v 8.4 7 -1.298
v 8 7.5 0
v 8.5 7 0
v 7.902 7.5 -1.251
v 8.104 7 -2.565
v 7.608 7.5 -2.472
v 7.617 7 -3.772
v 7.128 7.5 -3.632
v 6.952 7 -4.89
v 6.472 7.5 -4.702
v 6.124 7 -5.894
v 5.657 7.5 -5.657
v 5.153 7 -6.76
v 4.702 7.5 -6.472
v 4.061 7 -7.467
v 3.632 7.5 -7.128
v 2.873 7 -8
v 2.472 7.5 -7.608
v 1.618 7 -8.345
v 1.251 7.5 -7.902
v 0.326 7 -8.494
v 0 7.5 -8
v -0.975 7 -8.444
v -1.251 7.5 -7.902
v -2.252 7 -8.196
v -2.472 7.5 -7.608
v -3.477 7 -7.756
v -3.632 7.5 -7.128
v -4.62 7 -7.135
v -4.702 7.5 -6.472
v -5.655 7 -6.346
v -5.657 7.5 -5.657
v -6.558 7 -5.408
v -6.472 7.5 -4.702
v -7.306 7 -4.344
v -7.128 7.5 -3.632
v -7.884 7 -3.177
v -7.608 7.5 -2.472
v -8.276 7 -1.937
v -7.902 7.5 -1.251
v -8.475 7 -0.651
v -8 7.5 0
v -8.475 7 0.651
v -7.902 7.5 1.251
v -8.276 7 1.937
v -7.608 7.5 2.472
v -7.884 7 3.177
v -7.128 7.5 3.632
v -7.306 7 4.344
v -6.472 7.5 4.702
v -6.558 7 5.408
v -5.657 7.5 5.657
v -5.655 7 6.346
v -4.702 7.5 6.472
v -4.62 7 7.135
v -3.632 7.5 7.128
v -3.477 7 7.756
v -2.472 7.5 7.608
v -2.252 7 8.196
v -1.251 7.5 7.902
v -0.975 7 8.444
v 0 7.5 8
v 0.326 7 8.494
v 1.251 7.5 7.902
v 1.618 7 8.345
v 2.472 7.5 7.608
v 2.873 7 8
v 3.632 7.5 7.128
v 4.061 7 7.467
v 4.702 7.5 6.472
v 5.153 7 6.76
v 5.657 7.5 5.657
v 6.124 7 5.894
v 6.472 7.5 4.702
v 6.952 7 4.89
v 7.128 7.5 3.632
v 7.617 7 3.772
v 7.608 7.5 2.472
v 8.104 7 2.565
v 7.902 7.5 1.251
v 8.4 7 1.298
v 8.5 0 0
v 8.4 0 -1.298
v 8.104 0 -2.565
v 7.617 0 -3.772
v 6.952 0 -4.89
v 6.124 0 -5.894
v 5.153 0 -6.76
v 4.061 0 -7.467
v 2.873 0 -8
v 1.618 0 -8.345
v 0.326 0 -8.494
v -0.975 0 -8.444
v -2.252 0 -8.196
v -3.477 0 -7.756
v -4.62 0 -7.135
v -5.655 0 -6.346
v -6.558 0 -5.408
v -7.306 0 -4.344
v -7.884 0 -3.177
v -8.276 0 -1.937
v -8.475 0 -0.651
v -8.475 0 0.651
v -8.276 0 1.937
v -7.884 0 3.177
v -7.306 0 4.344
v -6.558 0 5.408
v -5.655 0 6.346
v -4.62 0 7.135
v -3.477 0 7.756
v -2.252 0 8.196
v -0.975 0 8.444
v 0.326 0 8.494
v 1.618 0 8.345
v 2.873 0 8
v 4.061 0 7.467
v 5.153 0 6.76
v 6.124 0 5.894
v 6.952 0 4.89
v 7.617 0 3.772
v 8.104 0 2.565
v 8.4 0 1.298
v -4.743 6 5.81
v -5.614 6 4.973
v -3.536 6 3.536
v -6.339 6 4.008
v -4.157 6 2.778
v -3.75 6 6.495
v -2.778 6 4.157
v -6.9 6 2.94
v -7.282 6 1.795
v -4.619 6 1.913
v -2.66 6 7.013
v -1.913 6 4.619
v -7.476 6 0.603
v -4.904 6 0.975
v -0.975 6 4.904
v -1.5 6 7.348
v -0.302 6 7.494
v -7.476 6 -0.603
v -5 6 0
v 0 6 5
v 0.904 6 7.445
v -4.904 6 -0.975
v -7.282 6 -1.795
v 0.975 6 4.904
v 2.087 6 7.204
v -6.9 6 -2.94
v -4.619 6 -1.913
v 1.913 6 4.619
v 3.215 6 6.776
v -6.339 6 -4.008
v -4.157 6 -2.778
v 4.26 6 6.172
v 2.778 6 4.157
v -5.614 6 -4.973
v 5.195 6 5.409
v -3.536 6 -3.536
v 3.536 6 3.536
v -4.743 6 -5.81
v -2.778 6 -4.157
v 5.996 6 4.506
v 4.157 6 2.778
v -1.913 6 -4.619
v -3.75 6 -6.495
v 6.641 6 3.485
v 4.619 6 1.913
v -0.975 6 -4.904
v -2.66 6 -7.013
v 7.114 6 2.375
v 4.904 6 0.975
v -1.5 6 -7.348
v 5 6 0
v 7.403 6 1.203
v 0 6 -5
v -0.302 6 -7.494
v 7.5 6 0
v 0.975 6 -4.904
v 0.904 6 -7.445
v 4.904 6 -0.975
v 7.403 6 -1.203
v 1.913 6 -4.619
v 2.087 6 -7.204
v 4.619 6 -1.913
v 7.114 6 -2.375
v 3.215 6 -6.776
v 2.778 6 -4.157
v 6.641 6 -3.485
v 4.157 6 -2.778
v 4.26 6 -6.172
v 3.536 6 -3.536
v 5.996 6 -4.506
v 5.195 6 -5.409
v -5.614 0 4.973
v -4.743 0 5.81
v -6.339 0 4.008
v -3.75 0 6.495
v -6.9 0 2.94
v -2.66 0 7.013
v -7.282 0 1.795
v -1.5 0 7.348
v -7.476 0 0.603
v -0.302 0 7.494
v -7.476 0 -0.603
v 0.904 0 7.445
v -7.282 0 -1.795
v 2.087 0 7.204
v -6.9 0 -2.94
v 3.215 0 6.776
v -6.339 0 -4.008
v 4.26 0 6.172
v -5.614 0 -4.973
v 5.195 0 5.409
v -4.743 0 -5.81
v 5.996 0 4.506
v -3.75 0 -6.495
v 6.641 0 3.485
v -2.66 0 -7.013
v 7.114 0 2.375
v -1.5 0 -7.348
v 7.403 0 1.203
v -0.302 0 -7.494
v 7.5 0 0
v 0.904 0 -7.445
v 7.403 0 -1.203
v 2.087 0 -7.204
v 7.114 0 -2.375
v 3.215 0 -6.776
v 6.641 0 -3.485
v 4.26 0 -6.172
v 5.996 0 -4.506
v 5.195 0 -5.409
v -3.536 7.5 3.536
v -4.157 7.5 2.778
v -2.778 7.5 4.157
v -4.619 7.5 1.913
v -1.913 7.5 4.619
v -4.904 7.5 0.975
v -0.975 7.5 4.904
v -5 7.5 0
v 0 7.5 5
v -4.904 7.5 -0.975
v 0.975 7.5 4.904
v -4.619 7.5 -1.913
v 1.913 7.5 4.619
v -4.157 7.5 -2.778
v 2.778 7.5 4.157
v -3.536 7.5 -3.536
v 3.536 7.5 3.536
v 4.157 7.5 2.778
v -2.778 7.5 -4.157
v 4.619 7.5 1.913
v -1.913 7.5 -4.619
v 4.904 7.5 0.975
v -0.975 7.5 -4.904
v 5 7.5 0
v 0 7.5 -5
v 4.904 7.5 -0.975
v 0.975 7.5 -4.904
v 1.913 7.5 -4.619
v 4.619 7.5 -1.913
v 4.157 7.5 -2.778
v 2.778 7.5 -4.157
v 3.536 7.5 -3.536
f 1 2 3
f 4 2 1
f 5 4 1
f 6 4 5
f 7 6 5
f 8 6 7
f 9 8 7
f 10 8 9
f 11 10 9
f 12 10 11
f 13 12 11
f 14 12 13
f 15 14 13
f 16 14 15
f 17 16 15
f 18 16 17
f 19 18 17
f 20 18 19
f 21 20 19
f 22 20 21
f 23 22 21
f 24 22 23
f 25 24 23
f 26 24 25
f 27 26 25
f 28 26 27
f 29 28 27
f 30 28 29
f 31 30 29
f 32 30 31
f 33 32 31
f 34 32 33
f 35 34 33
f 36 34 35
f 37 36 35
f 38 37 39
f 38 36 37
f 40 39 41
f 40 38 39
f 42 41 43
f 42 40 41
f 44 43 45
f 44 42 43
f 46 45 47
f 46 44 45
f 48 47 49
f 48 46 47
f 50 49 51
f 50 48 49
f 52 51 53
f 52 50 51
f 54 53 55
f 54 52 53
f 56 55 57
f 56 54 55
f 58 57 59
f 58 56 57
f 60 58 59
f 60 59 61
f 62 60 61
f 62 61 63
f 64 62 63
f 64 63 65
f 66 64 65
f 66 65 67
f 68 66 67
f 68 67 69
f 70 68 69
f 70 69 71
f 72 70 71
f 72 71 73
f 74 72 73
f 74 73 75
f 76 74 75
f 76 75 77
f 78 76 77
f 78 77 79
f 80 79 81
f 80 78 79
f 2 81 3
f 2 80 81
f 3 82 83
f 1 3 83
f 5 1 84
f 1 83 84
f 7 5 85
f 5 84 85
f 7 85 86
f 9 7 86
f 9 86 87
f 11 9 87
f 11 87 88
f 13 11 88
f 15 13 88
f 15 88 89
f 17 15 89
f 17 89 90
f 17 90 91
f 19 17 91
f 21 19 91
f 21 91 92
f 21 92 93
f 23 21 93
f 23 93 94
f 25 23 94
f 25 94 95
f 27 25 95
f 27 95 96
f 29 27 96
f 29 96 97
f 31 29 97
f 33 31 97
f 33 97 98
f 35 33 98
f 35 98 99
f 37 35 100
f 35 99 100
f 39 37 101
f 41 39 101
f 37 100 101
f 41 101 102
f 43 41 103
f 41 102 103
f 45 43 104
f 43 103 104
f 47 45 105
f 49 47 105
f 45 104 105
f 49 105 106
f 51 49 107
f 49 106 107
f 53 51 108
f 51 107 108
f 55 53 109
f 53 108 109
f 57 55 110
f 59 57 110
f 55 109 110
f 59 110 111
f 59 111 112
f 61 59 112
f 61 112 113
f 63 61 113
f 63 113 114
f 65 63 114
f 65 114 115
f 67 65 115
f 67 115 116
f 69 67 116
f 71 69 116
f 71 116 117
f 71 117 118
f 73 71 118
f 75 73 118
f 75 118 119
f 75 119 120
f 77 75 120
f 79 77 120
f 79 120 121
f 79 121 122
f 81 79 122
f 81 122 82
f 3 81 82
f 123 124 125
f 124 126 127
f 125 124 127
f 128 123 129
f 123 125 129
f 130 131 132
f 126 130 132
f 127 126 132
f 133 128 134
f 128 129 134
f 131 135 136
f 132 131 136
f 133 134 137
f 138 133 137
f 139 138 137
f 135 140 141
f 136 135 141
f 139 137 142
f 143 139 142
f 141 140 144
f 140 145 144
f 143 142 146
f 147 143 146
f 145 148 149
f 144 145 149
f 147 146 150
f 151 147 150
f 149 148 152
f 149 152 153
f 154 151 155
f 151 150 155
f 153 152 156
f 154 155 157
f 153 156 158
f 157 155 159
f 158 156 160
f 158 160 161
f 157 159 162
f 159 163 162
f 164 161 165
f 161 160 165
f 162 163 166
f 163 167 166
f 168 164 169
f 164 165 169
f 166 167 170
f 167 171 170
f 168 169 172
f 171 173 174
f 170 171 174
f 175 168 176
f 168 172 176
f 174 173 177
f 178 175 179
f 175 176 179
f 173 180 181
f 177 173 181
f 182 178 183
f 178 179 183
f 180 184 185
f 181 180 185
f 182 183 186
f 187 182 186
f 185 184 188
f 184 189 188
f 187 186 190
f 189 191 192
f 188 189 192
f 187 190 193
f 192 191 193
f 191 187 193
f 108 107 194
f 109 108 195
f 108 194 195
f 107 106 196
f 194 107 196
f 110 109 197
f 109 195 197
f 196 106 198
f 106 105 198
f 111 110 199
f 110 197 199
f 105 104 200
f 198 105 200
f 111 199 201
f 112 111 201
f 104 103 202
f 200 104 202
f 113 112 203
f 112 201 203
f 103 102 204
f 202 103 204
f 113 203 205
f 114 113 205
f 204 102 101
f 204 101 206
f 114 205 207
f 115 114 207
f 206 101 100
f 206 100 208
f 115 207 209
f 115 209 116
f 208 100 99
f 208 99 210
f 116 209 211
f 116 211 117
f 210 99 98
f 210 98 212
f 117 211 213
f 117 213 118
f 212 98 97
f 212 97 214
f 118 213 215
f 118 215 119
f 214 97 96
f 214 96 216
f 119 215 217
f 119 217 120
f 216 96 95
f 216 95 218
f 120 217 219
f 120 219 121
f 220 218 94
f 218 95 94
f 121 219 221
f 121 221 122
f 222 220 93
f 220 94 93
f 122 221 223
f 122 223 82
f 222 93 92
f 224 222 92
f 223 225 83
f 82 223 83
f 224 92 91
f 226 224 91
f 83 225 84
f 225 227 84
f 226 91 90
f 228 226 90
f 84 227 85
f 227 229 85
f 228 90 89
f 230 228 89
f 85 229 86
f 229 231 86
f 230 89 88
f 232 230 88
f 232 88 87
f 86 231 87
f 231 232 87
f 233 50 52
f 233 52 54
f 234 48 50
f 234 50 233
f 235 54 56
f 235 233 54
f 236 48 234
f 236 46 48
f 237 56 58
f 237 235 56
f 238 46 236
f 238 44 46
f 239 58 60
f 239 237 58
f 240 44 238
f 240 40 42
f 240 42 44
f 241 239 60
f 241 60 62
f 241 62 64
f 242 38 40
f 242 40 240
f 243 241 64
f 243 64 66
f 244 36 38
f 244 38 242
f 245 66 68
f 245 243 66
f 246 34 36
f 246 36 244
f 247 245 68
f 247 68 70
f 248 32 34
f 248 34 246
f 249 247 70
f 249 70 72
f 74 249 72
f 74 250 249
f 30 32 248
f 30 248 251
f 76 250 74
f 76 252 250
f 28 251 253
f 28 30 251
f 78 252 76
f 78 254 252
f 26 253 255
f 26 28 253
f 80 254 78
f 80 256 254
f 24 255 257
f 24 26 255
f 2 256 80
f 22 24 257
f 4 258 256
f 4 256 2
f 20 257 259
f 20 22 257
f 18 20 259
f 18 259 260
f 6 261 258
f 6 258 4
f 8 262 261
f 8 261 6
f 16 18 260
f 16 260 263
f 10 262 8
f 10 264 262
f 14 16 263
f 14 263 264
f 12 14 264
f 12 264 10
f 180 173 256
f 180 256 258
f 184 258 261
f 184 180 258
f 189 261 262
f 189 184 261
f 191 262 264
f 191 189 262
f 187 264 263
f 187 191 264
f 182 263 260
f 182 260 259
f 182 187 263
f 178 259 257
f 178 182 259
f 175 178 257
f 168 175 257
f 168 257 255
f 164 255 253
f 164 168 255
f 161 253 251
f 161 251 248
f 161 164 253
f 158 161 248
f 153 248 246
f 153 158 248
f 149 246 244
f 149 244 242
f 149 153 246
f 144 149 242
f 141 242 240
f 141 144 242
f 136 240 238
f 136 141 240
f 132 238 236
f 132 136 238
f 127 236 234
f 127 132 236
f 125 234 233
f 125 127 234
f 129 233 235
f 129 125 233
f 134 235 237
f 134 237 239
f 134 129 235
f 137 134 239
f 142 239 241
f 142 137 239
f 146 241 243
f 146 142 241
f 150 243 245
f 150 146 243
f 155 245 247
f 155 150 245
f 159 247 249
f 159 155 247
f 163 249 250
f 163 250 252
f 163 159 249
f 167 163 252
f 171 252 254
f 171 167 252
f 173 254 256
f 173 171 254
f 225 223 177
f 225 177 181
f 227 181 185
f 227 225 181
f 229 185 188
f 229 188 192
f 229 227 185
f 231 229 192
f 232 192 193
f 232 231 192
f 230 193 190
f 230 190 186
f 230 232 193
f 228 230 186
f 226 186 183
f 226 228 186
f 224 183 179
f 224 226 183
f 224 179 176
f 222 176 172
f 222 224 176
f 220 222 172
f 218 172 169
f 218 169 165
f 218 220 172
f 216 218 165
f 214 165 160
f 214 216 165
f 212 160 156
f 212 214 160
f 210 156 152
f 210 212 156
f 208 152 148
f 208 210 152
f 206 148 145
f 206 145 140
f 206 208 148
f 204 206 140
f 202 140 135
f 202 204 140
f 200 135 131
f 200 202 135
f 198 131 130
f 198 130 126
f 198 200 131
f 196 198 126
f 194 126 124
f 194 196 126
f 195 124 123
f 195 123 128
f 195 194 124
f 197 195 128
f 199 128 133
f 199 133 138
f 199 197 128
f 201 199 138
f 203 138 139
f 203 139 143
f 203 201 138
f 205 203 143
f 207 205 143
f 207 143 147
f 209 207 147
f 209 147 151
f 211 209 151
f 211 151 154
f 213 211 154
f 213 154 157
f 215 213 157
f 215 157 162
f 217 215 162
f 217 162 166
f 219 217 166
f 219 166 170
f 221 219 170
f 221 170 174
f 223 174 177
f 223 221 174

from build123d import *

# Parameters (mm, degrees)
SKETCH1_R           = 8.5
SKETCH1_R_2         = 7.5
BOSS_EXTRUDE1_DEPTH = 6
SKETCH3_R           = 8.5
SKETCH3_R_2         = 5
BOSS_EXTRUDE2_DEPTH = 1.5
CHAMFER1_SIZE       = 0.5


with BuildPart() as part:
    # Sketch1 → Boss-Extrude1 (new body)
    with BuildSketch(Plane(origin=(0, 0, 0), x_dir=(1, 0, 0), z_dir=(0, 1, 0))):
        Circle(SKETCH1_R)
        Circle(SKETCH1_R_2, mode=Mode.SUBTRACT)
    extrude(amount=BOSS_EXTRUDE1_DEPTH)

    # Sketch3 → Boss-Extrude2 (add)
    with BuildSketch(Plane(origin=(0, 6, 0), x_dir=(1, 0, 0), z_dir=(0, 1, 0))):
        Circle(SKETCH3_R)
        Circle(SKETCH3_R_2, mode=Mode.SUBTRACT)
    extrude(amount=BOSS_EXTRUDE2_DEPTH)

    # Chamfer1
    chamfer1_edges = [part.edges().sort_by_distance(p)[0] for p in [
        (-8.5, 7.5, 0),
    ]]
    chamfer(chamfer1_edges, length=CHAMFER1_SIZE)


solid = part.part
